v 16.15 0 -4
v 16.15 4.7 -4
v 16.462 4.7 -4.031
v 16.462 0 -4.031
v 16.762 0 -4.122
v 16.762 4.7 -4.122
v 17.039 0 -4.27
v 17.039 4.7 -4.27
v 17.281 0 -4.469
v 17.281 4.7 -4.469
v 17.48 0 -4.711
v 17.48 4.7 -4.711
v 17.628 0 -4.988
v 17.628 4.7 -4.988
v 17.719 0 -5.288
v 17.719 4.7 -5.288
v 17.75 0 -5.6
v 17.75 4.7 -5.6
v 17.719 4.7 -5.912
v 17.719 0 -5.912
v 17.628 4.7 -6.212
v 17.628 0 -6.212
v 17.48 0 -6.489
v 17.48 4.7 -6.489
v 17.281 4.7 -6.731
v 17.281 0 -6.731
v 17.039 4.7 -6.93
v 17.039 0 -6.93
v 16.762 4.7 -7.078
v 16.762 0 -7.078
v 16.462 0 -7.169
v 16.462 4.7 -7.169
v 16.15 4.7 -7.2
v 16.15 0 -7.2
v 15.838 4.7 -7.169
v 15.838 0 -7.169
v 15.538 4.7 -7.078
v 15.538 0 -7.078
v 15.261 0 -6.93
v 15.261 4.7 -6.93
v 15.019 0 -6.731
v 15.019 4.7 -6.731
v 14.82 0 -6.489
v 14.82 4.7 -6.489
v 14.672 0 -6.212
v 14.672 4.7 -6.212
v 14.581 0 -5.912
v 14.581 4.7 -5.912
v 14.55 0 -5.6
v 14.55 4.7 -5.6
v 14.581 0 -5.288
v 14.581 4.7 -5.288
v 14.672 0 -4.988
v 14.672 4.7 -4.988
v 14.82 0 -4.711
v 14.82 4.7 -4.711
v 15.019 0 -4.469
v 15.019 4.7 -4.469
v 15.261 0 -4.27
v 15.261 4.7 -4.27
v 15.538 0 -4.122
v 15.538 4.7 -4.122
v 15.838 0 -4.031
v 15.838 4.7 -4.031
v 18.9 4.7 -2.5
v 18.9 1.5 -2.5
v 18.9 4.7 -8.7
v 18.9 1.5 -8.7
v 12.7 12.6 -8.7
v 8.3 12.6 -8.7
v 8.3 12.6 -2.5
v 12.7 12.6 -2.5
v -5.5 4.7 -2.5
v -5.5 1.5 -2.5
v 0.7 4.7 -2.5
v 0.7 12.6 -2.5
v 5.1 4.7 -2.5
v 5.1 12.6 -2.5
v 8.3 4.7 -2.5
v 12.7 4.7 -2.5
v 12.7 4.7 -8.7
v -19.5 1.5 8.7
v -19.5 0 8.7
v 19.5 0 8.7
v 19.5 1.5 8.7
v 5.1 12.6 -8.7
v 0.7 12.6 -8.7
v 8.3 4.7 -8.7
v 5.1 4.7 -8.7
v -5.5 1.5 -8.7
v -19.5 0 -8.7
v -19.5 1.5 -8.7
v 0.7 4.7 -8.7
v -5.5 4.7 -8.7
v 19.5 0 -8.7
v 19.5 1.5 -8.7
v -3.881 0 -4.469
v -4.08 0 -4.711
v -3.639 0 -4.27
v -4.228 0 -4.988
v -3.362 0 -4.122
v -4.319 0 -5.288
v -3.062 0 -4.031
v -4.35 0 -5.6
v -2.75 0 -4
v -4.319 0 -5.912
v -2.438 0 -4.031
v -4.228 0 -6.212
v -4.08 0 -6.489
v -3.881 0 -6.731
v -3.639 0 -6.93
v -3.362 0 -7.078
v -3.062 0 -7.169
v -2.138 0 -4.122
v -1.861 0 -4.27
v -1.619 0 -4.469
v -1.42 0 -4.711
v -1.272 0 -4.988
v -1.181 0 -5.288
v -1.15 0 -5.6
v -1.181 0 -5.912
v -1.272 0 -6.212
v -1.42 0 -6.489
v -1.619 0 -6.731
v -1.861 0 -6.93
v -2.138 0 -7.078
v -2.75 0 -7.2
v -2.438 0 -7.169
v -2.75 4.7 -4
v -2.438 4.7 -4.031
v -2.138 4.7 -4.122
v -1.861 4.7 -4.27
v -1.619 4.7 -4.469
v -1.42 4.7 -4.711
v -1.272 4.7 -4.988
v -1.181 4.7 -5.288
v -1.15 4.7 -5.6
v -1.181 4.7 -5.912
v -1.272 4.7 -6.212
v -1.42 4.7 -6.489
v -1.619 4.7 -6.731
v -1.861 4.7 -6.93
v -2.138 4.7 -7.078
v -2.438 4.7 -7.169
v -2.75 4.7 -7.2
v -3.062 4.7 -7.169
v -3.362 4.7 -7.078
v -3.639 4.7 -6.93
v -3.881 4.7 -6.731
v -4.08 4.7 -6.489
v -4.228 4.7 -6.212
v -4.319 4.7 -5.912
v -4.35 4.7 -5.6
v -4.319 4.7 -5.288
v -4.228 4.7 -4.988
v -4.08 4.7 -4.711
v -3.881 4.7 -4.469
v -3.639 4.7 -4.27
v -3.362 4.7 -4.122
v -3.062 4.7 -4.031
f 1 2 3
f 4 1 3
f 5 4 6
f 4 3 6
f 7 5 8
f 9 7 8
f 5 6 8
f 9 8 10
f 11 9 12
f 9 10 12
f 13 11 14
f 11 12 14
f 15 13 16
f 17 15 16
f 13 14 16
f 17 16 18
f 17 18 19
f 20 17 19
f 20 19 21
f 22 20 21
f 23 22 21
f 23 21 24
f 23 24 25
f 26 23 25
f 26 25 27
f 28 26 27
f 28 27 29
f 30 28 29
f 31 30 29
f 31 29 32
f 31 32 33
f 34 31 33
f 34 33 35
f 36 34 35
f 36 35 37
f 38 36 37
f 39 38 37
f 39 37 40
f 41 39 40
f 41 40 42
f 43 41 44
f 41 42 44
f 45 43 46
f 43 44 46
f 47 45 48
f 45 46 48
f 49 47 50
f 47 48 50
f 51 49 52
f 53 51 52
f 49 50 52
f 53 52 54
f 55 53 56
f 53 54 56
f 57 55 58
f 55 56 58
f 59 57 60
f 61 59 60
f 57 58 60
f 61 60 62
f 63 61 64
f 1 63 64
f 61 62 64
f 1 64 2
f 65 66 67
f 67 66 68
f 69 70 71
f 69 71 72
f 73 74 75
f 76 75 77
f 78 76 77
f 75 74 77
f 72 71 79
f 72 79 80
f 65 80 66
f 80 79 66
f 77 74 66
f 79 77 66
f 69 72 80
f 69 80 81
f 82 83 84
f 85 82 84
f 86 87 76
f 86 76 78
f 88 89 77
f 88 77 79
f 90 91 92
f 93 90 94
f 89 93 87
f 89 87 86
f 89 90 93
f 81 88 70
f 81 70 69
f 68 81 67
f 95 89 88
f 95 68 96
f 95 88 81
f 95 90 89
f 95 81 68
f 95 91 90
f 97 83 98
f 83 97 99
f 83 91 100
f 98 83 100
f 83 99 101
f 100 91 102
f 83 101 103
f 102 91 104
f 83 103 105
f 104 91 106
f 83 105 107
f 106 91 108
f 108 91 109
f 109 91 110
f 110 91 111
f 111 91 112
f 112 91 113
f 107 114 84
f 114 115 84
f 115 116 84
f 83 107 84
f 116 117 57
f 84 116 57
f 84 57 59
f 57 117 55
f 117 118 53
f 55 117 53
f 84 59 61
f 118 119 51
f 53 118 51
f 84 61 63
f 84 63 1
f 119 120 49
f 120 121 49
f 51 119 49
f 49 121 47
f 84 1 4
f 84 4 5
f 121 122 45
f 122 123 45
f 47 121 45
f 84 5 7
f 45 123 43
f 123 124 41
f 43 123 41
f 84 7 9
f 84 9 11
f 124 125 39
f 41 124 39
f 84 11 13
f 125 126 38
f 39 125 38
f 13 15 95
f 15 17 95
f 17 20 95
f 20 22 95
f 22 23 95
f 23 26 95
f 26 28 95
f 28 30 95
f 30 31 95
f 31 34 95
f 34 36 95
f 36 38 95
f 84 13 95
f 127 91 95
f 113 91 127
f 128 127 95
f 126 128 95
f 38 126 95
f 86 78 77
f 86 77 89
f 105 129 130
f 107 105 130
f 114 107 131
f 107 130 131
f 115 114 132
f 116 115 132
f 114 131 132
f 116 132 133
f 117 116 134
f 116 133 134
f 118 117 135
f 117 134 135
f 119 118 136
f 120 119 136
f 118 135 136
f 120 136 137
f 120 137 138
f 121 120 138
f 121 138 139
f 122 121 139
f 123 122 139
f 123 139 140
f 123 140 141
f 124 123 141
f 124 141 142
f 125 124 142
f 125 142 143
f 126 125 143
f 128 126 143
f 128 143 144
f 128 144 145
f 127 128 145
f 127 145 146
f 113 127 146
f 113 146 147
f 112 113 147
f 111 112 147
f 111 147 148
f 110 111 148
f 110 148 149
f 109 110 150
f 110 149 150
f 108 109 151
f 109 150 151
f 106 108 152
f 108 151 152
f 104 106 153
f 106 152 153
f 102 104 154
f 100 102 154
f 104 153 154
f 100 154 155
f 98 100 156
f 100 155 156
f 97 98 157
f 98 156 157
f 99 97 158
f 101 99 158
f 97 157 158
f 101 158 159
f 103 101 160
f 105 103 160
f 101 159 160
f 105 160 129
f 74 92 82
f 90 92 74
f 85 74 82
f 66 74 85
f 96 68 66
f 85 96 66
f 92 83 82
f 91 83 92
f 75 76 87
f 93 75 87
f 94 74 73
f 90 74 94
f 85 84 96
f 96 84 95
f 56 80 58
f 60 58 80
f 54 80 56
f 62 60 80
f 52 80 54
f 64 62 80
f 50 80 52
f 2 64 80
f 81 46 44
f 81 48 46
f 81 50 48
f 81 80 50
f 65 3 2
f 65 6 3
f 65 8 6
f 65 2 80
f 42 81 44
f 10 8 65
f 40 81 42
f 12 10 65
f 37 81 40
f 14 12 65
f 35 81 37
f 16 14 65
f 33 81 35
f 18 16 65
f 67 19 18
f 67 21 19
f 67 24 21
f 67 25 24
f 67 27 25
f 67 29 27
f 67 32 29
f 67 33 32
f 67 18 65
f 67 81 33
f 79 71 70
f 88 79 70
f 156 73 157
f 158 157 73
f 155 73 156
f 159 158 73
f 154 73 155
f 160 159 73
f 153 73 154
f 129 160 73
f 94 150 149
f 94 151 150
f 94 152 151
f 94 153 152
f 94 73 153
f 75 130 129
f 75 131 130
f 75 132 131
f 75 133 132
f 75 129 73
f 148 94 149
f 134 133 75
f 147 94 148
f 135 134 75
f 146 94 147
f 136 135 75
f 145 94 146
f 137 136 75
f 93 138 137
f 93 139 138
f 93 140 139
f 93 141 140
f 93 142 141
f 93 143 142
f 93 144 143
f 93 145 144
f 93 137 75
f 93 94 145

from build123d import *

# Parameters (mm, degrees)
SKETCH1_W           = 39
SKETCH1_H           = 17.4
BOSS_EXTRUDE1_DEPTH = 1.5
SKETCH2_W           = 24.4
SKETCH2_H           = 6.2
BOSS_EXTRUDE2_DEPTH = 3.2
SKETCH3_W           = 4.4
SKETCH3_H           = 6.2
BOSS_EXTRUDE3_DEPTH = 7.9
SKETCH4_R           = 1.6
CUT_EXTRUDE1_DEPTH  = 23.767301114


with BuildPart() as part:
    # Sketch1 → Boss-Extrude1 (new body)
    with BuildSketch(Plane(origin=(0, 0, 0), x_dir=(1, 0, 0), z_dir=(0, 1, 0))):
        Rectangle(SKETCH1_W, SKETCH1_H)
    extrude(amount=BOSS_EXTRUDE1_DEPTH)

    # Sketch2 → Boss-Extrude2 (add)
    with BuildSketch(Plane(origin=(0, 1.5, 0), x_dir=(1, 0, 0), z_dir=(0, 1, 0))):
        with Locations((6.7, 5.6)):
            Rectangle(SKETCH2_W, SKETCH2_H)
    extrude(amount=BOSS_EXTRUDE2_DEPTH)

    # Sketch3 → Boss-Extrude3 (add)
    with BuildSketch(Plane(origin=(0, 4.7, 0), x_dir=(1, 0, 0), z_dir=(0, 1, 0))):
        with Locations((2.9, 5.6)):
            Rectangle(SKETCH3_W, SKETCH3_H)
        with Locations((10.5, 5.6)):
            Rectangle(SKETCH3_W, SKETCH3_H)
    extrude(amount=BOSS_EXTRUDE3_DEPTH)

    # Sketch4 → Cut-Extrude1 (cut, through all)
    with BuildSketch(Plane(origin=(0, 4.7, 0), x_dir=(1, 0, 0), z_dir=(0, 1, 0))):
        with Locations(Location((-2.75, 5.6, 0), (0, 0, 270))):
            Circle(SKETCH4_R)
        with Locations(Location((16.15, 5.6, 0), (0, 0, 270))):
            Circle(SKETCH4_R)
    extrude(amount=-CUT_EXTRUDE1_DEPTH, mode=Mode.SUBTRACT)


solid = part.part
